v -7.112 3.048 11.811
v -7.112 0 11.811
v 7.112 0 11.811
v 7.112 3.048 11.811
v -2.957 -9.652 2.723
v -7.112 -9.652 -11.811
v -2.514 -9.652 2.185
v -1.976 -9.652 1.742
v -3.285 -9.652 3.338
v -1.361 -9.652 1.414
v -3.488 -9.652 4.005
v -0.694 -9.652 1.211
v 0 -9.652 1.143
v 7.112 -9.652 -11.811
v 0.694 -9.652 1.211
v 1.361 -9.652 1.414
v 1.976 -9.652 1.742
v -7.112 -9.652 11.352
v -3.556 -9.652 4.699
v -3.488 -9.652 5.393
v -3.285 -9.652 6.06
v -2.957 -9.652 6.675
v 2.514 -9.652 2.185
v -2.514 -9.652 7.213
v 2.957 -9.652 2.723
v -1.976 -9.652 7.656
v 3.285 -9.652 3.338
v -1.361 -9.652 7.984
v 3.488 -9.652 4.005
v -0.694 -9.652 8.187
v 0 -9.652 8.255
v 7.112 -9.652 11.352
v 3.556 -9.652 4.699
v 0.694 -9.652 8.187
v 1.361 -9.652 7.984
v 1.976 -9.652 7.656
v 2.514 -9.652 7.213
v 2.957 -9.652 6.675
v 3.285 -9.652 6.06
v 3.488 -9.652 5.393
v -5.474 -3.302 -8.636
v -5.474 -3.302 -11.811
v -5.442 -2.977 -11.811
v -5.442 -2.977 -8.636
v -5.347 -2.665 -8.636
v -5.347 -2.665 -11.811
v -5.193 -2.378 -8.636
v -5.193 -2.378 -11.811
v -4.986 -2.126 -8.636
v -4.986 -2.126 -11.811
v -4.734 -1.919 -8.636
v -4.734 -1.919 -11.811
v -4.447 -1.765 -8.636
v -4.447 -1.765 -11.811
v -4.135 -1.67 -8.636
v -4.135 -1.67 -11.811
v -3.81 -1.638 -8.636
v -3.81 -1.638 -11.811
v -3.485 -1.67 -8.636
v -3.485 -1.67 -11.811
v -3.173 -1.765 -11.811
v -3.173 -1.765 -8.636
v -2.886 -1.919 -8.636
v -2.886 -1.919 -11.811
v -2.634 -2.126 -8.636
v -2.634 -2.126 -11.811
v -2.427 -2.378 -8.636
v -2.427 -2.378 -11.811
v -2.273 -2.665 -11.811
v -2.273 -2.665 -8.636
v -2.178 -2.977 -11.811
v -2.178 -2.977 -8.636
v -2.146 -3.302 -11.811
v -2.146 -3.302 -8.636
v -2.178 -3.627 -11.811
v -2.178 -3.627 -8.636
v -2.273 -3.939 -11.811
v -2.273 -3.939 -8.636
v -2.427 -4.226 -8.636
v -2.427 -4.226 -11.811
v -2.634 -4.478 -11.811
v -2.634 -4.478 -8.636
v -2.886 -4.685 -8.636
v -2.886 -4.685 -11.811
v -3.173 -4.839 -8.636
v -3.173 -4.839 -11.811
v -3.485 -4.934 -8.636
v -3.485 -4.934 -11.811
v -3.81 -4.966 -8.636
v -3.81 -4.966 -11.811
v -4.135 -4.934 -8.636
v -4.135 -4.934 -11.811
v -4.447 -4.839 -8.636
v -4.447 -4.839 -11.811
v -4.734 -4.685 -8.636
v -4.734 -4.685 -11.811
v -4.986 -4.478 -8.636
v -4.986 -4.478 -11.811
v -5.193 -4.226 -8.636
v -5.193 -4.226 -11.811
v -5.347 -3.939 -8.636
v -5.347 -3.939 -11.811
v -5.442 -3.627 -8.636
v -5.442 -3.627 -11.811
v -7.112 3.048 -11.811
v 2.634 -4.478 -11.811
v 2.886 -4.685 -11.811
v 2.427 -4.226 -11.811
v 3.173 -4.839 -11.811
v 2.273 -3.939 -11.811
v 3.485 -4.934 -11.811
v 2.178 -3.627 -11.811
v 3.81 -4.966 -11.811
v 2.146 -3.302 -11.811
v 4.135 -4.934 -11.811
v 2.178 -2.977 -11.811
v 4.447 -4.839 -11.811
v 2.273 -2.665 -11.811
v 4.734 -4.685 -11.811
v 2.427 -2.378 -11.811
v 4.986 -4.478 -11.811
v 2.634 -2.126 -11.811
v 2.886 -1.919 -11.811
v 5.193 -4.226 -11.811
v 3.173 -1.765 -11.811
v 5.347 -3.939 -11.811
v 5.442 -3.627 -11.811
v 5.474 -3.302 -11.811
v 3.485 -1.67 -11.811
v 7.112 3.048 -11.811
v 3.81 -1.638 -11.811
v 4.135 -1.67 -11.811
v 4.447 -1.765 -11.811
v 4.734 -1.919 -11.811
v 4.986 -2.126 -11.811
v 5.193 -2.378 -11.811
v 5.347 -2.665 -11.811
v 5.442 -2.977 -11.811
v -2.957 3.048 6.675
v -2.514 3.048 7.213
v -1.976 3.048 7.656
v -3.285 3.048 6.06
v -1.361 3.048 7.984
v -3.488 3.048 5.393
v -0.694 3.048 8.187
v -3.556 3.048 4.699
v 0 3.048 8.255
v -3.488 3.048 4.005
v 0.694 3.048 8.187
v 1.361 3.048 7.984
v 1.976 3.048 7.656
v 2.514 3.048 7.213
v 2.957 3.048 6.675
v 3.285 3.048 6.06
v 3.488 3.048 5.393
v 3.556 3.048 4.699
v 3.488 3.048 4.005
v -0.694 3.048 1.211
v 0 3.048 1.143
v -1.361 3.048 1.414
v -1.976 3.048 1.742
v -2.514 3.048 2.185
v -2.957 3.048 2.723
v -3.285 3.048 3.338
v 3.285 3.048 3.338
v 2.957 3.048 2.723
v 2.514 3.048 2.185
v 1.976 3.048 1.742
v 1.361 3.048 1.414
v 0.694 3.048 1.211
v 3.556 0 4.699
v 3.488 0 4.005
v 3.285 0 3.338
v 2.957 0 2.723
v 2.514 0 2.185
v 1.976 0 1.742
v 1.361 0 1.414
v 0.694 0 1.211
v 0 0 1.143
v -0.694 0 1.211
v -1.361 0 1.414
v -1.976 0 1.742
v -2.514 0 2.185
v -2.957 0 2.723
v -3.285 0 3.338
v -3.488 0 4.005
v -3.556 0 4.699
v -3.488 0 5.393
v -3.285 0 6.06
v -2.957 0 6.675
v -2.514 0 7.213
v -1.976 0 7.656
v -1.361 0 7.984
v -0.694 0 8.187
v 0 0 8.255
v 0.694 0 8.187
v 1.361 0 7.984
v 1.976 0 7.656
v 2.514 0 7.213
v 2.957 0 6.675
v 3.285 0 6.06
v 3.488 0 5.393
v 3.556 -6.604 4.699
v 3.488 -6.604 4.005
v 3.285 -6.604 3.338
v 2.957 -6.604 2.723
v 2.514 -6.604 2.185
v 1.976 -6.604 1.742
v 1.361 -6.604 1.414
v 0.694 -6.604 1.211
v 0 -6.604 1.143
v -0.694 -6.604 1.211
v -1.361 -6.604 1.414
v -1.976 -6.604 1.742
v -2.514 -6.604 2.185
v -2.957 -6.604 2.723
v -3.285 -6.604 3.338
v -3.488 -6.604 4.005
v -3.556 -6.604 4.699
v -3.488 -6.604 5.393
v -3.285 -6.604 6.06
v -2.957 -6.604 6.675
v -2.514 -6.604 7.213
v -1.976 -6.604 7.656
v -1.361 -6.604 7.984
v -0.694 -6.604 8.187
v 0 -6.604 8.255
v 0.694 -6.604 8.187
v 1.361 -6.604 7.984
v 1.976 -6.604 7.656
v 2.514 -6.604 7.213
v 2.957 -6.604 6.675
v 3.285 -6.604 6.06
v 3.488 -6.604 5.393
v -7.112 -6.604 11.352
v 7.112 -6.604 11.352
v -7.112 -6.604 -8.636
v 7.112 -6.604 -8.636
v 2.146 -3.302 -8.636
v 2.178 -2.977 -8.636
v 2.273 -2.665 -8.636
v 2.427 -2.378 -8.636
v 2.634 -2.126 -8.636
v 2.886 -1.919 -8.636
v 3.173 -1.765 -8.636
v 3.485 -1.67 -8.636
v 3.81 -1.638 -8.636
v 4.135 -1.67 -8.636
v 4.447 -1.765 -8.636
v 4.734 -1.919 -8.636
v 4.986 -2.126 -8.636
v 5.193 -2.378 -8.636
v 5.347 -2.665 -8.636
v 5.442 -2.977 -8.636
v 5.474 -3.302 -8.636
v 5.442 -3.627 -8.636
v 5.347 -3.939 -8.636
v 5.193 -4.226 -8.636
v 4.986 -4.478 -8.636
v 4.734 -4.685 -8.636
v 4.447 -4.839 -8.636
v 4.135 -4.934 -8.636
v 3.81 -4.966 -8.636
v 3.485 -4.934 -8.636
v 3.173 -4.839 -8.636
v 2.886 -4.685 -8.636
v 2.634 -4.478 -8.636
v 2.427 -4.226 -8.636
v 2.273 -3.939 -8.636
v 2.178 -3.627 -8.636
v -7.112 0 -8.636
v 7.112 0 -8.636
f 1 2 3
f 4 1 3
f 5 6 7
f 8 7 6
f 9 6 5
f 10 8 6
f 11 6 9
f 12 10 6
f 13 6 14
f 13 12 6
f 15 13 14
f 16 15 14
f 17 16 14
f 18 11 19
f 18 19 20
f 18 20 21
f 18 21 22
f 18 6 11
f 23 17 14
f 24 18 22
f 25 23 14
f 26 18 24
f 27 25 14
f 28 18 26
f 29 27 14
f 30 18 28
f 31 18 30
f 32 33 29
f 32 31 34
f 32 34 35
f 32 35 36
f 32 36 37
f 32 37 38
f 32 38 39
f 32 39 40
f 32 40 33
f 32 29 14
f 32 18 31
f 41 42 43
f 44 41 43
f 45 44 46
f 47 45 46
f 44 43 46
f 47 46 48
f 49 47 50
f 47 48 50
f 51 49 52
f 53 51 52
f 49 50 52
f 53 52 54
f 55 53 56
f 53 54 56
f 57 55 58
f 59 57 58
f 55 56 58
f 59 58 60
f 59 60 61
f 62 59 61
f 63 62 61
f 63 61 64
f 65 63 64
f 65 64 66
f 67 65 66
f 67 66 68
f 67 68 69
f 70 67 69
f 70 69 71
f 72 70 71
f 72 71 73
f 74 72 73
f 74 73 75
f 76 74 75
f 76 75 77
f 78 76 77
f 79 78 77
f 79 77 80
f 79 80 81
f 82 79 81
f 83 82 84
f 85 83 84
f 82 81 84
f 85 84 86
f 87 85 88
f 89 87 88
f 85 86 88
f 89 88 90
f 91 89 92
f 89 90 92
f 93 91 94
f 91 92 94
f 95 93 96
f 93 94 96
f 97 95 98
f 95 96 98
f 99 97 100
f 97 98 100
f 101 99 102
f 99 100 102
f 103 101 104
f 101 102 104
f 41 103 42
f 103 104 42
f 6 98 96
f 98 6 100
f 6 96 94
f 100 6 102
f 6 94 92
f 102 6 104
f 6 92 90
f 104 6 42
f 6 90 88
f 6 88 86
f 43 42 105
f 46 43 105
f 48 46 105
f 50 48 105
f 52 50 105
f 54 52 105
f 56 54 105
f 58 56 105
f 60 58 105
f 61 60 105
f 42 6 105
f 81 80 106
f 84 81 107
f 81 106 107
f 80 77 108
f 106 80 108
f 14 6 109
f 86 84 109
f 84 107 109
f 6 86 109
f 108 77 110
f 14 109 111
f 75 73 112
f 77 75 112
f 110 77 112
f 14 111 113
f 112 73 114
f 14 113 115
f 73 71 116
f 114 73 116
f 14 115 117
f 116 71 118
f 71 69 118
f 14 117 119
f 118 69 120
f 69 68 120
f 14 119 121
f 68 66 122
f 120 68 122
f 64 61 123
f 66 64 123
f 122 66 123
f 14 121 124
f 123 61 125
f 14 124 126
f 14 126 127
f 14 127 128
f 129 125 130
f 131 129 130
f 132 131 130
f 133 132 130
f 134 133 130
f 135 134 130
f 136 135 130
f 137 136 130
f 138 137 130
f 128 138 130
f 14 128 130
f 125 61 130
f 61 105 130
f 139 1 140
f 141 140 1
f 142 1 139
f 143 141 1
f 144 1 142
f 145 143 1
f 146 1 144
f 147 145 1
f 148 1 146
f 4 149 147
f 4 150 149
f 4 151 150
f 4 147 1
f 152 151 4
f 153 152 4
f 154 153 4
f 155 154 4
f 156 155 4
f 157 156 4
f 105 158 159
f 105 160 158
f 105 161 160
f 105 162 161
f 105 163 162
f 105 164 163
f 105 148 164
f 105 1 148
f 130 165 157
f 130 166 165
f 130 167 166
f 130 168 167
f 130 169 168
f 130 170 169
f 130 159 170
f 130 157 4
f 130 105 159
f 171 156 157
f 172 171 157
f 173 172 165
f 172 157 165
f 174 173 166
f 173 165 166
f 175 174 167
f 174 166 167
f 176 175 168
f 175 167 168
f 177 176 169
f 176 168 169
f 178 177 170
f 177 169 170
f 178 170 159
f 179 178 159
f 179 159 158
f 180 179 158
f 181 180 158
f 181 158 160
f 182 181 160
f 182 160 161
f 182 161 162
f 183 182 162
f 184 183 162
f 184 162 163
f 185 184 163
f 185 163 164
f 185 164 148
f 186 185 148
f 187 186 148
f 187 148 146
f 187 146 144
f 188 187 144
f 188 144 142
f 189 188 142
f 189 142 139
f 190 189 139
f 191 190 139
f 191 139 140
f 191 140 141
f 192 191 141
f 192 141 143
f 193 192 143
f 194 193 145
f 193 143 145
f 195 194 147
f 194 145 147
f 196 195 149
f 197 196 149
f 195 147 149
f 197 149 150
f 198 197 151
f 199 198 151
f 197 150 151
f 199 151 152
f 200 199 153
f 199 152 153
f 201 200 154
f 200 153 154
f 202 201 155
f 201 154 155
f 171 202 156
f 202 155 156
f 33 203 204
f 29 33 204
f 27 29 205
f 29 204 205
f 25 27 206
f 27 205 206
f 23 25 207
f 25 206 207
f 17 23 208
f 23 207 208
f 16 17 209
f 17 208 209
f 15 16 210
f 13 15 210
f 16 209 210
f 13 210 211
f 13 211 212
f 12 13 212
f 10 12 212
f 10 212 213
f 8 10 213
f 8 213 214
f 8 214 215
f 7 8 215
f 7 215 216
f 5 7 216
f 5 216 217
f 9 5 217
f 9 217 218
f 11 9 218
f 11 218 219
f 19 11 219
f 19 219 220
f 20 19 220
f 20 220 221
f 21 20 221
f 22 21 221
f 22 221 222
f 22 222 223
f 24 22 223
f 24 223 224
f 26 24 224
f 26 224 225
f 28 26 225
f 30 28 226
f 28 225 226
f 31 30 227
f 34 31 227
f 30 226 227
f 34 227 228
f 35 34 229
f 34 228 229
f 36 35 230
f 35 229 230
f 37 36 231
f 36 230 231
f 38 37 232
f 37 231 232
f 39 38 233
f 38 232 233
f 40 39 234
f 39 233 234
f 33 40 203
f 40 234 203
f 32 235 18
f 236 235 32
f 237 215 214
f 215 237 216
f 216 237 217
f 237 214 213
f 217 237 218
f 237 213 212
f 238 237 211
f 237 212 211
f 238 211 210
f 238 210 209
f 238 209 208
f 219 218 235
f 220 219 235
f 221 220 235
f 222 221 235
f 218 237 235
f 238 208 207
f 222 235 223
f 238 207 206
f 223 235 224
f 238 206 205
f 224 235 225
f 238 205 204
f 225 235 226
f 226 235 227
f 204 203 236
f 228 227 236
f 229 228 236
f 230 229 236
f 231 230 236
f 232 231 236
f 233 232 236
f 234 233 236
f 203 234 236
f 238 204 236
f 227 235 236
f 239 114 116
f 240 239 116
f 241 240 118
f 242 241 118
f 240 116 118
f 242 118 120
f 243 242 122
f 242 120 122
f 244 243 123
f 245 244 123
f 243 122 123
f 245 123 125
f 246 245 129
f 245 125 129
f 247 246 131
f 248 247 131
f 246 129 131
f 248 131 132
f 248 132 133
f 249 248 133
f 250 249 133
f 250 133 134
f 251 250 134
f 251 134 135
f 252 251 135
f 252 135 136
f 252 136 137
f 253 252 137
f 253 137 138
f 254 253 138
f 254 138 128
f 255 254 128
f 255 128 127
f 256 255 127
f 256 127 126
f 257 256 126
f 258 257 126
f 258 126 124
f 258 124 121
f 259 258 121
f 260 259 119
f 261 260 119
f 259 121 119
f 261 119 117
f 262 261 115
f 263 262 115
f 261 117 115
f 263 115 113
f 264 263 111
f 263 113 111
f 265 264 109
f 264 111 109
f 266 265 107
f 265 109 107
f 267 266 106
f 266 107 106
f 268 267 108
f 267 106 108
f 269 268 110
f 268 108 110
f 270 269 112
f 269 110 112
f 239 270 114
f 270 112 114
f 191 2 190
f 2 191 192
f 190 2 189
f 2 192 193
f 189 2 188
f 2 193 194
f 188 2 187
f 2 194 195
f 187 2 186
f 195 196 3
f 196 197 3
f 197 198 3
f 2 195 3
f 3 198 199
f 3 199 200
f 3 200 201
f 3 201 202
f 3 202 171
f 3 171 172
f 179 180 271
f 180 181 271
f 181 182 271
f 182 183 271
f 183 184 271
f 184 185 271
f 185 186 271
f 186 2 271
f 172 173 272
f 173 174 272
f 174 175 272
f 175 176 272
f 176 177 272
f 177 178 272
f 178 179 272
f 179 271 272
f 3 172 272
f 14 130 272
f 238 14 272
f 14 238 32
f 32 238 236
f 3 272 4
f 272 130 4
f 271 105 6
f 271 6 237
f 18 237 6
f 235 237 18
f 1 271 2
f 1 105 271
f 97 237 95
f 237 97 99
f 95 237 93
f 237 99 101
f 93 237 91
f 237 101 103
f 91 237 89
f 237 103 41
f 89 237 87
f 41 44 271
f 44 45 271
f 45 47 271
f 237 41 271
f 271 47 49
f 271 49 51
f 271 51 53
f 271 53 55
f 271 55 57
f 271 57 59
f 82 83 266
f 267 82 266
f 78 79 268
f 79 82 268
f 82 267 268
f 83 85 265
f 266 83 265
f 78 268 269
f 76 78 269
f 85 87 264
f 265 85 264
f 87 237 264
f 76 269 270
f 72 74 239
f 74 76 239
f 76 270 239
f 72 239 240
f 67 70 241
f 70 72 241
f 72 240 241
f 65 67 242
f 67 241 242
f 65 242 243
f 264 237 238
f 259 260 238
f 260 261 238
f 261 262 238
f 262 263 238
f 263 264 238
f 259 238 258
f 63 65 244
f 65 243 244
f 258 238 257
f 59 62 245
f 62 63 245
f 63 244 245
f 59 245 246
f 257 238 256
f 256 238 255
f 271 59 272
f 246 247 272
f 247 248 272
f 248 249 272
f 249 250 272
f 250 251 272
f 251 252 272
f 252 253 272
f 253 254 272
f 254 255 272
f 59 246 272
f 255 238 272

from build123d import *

# Parameters (mm, degrees)
SKETCH1_W                 = 14.224
SKETCH1_H                 = 23.622
BOSS_EXTRUDE1_DEPTH       = 3.048
SKETCH2_W                 = 3.175
SKETCH2_H                 = 6.604
MIDDLE_DEPTH              = 14.224
SKETCH3_W                 = 14.224
SKETCH3_H                 = 23.162672358
BOTTOM_DEPTH              = 3.048
SKETCH4_R                 = 3.556
HOLE_FOR_CLEVIS_PIN_DEPTH = 13.7
SKETCH5_R                 = 1.6637
HOLES_FOR_SCREWS_DEPTH    = 24.622


with BuildPart() as part:
    # Sketch1 → Boss-Extrude1 (new body)
    with BuildSketch(Plane(origin=(0, 0, 0), x_dir=(1, 0, 0), z_dir=(0, 1, 0))):
        Rectangle(SKETCH1_W, SKETCH1_H)
    extrude(amount=BOSS_EXTRUDE1_DEPTH)

    # Sketch2 → middle (add)
    with BuildSketch(Plane(origin=(7.112, 0, 0), x_dir=(0, 0, -1), z_dir=(1, 0, 0))):
        with Locations((10.2235, -3.302)):
            Rectangle(SKETCH2_W, SKETCH2_H)
    extrude(amount=-MIDDLE_DEPTH)

    # Sketch3 → bottom (add)
    with BuildSketch(Plane.XZ.offset(6.604)):
        with Locations((0, -0.229663821)):
            Rectangle(SKETCH3_W, SKETCH3_H)
    extrude(amount=BOTTOM_DEPTH)

    # Sketch4 → hole for clevis pin (cut, through all)
    with BuildSketch(Plane(origin=(0, 3.048, 0), x_dir=(1, 0, 0), z_dir=(0, 1, 0))):
        with Locations((0, -4.699)):
            Circle(SKETCH4_R)
    extrude(amount=-HOLE_FOR_CLEVIS_PIN_DEPTH, mode=Mode.SUBTRACT)

    # Sketch5 → holes for screws (cut, through all)
    with BuildSketch(Plane(origin=(0, 0, -11.811), x_dir=(-1, 0, 0), z_dir=(0, 0, -1))):
        with Locations((-3.81, -3.302)):
            Circle(SKETCH5_R)
        with Locations((3.81, -3.302)):
            Circle(SKETCH5_R)
    extrude(amount=-HOLES_FOR_SCREWS_DEPTH, mode=Mode.SUBTRACT)


solid = part.part
